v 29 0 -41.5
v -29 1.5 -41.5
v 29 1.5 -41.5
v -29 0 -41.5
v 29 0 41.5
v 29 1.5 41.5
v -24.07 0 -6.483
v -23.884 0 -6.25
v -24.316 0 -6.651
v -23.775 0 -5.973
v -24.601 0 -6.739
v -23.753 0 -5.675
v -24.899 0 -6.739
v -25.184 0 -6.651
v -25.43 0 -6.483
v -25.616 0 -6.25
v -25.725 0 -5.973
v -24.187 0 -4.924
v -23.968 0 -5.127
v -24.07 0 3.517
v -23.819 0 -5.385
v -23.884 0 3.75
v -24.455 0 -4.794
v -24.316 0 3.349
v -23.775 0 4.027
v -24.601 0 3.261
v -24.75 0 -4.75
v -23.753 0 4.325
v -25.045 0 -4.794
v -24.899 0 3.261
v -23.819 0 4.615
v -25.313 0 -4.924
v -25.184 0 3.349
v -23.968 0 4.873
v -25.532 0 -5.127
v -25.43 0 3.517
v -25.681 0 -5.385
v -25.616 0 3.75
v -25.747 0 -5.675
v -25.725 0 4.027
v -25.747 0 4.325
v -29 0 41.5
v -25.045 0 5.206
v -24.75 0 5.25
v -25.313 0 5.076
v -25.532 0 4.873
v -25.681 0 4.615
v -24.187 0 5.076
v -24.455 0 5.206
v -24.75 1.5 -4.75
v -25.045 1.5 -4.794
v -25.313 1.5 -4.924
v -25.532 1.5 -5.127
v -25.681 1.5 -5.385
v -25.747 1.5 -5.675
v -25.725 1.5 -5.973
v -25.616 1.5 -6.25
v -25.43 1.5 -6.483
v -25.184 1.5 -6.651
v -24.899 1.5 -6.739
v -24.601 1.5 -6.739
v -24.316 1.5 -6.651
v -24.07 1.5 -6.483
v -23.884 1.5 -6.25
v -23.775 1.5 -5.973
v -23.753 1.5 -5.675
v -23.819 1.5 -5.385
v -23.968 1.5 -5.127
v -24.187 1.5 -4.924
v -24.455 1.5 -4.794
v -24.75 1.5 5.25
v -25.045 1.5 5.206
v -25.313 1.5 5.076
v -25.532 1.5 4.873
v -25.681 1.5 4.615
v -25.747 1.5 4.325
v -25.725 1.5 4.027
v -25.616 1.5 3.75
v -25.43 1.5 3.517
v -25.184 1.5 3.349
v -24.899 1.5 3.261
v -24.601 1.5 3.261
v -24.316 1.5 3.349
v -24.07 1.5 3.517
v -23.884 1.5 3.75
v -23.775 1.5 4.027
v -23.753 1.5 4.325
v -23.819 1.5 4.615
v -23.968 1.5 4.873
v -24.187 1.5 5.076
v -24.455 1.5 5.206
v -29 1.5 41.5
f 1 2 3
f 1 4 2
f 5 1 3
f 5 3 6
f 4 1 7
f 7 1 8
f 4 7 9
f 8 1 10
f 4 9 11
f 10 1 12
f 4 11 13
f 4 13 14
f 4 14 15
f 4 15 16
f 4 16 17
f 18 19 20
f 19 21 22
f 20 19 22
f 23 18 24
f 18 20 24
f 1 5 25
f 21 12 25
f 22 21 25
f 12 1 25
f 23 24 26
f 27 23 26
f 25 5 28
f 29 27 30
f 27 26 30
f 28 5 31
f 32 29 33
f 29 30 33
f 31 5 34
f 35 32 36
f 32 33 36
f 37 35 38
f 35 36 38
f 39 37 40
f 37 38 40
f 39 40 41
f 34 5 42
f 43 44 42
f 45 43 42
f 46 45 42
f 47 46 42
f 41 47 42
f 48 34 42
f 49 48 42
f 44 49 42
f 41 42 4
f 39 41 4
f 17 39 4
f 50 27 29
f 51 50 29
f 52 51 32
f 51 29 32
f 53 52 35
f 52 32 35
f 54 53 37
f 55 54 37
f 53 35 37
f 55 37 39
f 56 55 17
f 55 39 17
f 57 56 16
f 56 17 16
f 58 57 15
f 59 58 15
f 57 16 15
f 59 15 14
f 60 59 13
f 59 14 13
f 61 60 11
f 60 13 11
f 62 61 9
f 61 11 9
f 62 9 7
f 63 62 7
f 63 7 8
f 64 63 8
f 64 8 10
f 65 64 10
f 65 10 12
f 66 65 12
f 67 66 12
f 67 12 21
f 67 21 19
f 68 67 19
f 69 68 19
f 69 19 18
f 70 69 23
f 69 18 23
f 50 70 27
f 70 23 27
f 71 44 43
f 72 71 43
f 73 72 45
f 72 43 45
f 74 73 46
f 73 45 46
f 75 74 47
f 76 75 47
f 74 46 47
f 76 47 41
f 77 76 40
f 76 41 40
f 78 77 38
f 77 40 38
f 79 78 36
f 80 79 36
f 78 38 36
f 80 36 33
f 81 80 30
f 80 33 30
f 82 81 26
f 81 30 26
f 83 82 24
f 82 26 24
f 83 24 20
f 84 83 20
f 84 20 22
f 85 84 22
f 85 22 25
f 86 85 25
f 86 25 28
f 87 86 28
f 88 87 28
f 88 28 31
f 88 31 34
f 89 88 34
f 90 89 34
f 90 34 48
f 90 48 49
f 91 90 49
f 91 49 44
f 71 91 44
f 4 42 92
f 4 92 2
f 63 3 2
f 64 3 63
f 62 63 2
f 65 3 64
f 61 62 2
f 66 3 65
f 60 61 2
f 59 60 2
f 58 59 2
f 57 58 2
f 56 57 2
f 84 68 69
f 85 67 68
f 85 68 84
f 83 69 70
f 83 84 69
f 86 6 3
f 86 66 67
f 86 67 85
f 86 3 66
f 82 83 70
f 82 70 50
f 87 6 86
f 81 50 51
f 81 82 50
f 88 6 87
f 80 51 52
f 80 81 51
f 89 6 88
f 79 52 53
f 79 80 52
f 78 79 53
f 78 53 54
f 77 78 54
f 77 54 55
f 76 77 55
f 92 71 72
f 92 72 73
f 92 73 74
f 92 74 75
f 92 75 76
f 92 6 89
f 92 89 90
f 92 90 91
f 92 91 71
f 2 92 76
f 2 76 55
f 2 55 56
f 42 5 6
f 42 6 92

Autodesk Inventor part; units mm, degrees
ref_plane "YZ Plane" through (0, 0, 0) normal (1, 0, 0) x (0, 1, 0)
ref_plane "XZ Plane" through (0, 0, 0) normal (0, 1, 0) x (-1, 0, 0)
ref_plane "XY Plane" through (0, 0, 0) normal (0, 0, 1) x (1, 0, 0)
sketch "Sketch1" plane through (0, 0, 0) normal (0, 1, 0) x (-1, 0, 0)
  line L0 (-29, 41.5) -> (29, 41.5)
  line L1 (29, 41.5) -> (29, -41.5)
  line L2 (29, -41.5) -> (-29, -41.5)
  line L3 (-29, -41.5) -> (-29, 41.5)
  line L4 (-29, 41.5) -> (29, -41.5) construction
  line L5 (29, 41.5) -> (-29, -41.5) construction
  point P0 (0, 0)
  dimension "d0" = 83
  dimension "d1" = 58
extrude "Extrusion1" add sketch "Sketch1" along normal blind 1.5
sketch "Sketch2" plane through (0, 1.5, 0) normal (0, 1, 0) x (1, 0, 0)
  line L0 (-29, 41.5) -> (-29, -41.5) projected
  point P0 (0, 0)
  point P1 (-24.75, 5.75)
  point P2 (-24.75, -4.25)
  point P3 (-29, 0)
  dimension "d11" = 10
  dimension "d12" = 4.25
  dimension "d13" = 4.25
  dimension "d14" = 5.75
hole "Hole1" at (-24.75, 1.5, -5.75) at (-24.75, 1.5, 4.25) direction (0, -1, 0) diameter 2 end through all
properties part number "pcb" material "PBT Plastic"
